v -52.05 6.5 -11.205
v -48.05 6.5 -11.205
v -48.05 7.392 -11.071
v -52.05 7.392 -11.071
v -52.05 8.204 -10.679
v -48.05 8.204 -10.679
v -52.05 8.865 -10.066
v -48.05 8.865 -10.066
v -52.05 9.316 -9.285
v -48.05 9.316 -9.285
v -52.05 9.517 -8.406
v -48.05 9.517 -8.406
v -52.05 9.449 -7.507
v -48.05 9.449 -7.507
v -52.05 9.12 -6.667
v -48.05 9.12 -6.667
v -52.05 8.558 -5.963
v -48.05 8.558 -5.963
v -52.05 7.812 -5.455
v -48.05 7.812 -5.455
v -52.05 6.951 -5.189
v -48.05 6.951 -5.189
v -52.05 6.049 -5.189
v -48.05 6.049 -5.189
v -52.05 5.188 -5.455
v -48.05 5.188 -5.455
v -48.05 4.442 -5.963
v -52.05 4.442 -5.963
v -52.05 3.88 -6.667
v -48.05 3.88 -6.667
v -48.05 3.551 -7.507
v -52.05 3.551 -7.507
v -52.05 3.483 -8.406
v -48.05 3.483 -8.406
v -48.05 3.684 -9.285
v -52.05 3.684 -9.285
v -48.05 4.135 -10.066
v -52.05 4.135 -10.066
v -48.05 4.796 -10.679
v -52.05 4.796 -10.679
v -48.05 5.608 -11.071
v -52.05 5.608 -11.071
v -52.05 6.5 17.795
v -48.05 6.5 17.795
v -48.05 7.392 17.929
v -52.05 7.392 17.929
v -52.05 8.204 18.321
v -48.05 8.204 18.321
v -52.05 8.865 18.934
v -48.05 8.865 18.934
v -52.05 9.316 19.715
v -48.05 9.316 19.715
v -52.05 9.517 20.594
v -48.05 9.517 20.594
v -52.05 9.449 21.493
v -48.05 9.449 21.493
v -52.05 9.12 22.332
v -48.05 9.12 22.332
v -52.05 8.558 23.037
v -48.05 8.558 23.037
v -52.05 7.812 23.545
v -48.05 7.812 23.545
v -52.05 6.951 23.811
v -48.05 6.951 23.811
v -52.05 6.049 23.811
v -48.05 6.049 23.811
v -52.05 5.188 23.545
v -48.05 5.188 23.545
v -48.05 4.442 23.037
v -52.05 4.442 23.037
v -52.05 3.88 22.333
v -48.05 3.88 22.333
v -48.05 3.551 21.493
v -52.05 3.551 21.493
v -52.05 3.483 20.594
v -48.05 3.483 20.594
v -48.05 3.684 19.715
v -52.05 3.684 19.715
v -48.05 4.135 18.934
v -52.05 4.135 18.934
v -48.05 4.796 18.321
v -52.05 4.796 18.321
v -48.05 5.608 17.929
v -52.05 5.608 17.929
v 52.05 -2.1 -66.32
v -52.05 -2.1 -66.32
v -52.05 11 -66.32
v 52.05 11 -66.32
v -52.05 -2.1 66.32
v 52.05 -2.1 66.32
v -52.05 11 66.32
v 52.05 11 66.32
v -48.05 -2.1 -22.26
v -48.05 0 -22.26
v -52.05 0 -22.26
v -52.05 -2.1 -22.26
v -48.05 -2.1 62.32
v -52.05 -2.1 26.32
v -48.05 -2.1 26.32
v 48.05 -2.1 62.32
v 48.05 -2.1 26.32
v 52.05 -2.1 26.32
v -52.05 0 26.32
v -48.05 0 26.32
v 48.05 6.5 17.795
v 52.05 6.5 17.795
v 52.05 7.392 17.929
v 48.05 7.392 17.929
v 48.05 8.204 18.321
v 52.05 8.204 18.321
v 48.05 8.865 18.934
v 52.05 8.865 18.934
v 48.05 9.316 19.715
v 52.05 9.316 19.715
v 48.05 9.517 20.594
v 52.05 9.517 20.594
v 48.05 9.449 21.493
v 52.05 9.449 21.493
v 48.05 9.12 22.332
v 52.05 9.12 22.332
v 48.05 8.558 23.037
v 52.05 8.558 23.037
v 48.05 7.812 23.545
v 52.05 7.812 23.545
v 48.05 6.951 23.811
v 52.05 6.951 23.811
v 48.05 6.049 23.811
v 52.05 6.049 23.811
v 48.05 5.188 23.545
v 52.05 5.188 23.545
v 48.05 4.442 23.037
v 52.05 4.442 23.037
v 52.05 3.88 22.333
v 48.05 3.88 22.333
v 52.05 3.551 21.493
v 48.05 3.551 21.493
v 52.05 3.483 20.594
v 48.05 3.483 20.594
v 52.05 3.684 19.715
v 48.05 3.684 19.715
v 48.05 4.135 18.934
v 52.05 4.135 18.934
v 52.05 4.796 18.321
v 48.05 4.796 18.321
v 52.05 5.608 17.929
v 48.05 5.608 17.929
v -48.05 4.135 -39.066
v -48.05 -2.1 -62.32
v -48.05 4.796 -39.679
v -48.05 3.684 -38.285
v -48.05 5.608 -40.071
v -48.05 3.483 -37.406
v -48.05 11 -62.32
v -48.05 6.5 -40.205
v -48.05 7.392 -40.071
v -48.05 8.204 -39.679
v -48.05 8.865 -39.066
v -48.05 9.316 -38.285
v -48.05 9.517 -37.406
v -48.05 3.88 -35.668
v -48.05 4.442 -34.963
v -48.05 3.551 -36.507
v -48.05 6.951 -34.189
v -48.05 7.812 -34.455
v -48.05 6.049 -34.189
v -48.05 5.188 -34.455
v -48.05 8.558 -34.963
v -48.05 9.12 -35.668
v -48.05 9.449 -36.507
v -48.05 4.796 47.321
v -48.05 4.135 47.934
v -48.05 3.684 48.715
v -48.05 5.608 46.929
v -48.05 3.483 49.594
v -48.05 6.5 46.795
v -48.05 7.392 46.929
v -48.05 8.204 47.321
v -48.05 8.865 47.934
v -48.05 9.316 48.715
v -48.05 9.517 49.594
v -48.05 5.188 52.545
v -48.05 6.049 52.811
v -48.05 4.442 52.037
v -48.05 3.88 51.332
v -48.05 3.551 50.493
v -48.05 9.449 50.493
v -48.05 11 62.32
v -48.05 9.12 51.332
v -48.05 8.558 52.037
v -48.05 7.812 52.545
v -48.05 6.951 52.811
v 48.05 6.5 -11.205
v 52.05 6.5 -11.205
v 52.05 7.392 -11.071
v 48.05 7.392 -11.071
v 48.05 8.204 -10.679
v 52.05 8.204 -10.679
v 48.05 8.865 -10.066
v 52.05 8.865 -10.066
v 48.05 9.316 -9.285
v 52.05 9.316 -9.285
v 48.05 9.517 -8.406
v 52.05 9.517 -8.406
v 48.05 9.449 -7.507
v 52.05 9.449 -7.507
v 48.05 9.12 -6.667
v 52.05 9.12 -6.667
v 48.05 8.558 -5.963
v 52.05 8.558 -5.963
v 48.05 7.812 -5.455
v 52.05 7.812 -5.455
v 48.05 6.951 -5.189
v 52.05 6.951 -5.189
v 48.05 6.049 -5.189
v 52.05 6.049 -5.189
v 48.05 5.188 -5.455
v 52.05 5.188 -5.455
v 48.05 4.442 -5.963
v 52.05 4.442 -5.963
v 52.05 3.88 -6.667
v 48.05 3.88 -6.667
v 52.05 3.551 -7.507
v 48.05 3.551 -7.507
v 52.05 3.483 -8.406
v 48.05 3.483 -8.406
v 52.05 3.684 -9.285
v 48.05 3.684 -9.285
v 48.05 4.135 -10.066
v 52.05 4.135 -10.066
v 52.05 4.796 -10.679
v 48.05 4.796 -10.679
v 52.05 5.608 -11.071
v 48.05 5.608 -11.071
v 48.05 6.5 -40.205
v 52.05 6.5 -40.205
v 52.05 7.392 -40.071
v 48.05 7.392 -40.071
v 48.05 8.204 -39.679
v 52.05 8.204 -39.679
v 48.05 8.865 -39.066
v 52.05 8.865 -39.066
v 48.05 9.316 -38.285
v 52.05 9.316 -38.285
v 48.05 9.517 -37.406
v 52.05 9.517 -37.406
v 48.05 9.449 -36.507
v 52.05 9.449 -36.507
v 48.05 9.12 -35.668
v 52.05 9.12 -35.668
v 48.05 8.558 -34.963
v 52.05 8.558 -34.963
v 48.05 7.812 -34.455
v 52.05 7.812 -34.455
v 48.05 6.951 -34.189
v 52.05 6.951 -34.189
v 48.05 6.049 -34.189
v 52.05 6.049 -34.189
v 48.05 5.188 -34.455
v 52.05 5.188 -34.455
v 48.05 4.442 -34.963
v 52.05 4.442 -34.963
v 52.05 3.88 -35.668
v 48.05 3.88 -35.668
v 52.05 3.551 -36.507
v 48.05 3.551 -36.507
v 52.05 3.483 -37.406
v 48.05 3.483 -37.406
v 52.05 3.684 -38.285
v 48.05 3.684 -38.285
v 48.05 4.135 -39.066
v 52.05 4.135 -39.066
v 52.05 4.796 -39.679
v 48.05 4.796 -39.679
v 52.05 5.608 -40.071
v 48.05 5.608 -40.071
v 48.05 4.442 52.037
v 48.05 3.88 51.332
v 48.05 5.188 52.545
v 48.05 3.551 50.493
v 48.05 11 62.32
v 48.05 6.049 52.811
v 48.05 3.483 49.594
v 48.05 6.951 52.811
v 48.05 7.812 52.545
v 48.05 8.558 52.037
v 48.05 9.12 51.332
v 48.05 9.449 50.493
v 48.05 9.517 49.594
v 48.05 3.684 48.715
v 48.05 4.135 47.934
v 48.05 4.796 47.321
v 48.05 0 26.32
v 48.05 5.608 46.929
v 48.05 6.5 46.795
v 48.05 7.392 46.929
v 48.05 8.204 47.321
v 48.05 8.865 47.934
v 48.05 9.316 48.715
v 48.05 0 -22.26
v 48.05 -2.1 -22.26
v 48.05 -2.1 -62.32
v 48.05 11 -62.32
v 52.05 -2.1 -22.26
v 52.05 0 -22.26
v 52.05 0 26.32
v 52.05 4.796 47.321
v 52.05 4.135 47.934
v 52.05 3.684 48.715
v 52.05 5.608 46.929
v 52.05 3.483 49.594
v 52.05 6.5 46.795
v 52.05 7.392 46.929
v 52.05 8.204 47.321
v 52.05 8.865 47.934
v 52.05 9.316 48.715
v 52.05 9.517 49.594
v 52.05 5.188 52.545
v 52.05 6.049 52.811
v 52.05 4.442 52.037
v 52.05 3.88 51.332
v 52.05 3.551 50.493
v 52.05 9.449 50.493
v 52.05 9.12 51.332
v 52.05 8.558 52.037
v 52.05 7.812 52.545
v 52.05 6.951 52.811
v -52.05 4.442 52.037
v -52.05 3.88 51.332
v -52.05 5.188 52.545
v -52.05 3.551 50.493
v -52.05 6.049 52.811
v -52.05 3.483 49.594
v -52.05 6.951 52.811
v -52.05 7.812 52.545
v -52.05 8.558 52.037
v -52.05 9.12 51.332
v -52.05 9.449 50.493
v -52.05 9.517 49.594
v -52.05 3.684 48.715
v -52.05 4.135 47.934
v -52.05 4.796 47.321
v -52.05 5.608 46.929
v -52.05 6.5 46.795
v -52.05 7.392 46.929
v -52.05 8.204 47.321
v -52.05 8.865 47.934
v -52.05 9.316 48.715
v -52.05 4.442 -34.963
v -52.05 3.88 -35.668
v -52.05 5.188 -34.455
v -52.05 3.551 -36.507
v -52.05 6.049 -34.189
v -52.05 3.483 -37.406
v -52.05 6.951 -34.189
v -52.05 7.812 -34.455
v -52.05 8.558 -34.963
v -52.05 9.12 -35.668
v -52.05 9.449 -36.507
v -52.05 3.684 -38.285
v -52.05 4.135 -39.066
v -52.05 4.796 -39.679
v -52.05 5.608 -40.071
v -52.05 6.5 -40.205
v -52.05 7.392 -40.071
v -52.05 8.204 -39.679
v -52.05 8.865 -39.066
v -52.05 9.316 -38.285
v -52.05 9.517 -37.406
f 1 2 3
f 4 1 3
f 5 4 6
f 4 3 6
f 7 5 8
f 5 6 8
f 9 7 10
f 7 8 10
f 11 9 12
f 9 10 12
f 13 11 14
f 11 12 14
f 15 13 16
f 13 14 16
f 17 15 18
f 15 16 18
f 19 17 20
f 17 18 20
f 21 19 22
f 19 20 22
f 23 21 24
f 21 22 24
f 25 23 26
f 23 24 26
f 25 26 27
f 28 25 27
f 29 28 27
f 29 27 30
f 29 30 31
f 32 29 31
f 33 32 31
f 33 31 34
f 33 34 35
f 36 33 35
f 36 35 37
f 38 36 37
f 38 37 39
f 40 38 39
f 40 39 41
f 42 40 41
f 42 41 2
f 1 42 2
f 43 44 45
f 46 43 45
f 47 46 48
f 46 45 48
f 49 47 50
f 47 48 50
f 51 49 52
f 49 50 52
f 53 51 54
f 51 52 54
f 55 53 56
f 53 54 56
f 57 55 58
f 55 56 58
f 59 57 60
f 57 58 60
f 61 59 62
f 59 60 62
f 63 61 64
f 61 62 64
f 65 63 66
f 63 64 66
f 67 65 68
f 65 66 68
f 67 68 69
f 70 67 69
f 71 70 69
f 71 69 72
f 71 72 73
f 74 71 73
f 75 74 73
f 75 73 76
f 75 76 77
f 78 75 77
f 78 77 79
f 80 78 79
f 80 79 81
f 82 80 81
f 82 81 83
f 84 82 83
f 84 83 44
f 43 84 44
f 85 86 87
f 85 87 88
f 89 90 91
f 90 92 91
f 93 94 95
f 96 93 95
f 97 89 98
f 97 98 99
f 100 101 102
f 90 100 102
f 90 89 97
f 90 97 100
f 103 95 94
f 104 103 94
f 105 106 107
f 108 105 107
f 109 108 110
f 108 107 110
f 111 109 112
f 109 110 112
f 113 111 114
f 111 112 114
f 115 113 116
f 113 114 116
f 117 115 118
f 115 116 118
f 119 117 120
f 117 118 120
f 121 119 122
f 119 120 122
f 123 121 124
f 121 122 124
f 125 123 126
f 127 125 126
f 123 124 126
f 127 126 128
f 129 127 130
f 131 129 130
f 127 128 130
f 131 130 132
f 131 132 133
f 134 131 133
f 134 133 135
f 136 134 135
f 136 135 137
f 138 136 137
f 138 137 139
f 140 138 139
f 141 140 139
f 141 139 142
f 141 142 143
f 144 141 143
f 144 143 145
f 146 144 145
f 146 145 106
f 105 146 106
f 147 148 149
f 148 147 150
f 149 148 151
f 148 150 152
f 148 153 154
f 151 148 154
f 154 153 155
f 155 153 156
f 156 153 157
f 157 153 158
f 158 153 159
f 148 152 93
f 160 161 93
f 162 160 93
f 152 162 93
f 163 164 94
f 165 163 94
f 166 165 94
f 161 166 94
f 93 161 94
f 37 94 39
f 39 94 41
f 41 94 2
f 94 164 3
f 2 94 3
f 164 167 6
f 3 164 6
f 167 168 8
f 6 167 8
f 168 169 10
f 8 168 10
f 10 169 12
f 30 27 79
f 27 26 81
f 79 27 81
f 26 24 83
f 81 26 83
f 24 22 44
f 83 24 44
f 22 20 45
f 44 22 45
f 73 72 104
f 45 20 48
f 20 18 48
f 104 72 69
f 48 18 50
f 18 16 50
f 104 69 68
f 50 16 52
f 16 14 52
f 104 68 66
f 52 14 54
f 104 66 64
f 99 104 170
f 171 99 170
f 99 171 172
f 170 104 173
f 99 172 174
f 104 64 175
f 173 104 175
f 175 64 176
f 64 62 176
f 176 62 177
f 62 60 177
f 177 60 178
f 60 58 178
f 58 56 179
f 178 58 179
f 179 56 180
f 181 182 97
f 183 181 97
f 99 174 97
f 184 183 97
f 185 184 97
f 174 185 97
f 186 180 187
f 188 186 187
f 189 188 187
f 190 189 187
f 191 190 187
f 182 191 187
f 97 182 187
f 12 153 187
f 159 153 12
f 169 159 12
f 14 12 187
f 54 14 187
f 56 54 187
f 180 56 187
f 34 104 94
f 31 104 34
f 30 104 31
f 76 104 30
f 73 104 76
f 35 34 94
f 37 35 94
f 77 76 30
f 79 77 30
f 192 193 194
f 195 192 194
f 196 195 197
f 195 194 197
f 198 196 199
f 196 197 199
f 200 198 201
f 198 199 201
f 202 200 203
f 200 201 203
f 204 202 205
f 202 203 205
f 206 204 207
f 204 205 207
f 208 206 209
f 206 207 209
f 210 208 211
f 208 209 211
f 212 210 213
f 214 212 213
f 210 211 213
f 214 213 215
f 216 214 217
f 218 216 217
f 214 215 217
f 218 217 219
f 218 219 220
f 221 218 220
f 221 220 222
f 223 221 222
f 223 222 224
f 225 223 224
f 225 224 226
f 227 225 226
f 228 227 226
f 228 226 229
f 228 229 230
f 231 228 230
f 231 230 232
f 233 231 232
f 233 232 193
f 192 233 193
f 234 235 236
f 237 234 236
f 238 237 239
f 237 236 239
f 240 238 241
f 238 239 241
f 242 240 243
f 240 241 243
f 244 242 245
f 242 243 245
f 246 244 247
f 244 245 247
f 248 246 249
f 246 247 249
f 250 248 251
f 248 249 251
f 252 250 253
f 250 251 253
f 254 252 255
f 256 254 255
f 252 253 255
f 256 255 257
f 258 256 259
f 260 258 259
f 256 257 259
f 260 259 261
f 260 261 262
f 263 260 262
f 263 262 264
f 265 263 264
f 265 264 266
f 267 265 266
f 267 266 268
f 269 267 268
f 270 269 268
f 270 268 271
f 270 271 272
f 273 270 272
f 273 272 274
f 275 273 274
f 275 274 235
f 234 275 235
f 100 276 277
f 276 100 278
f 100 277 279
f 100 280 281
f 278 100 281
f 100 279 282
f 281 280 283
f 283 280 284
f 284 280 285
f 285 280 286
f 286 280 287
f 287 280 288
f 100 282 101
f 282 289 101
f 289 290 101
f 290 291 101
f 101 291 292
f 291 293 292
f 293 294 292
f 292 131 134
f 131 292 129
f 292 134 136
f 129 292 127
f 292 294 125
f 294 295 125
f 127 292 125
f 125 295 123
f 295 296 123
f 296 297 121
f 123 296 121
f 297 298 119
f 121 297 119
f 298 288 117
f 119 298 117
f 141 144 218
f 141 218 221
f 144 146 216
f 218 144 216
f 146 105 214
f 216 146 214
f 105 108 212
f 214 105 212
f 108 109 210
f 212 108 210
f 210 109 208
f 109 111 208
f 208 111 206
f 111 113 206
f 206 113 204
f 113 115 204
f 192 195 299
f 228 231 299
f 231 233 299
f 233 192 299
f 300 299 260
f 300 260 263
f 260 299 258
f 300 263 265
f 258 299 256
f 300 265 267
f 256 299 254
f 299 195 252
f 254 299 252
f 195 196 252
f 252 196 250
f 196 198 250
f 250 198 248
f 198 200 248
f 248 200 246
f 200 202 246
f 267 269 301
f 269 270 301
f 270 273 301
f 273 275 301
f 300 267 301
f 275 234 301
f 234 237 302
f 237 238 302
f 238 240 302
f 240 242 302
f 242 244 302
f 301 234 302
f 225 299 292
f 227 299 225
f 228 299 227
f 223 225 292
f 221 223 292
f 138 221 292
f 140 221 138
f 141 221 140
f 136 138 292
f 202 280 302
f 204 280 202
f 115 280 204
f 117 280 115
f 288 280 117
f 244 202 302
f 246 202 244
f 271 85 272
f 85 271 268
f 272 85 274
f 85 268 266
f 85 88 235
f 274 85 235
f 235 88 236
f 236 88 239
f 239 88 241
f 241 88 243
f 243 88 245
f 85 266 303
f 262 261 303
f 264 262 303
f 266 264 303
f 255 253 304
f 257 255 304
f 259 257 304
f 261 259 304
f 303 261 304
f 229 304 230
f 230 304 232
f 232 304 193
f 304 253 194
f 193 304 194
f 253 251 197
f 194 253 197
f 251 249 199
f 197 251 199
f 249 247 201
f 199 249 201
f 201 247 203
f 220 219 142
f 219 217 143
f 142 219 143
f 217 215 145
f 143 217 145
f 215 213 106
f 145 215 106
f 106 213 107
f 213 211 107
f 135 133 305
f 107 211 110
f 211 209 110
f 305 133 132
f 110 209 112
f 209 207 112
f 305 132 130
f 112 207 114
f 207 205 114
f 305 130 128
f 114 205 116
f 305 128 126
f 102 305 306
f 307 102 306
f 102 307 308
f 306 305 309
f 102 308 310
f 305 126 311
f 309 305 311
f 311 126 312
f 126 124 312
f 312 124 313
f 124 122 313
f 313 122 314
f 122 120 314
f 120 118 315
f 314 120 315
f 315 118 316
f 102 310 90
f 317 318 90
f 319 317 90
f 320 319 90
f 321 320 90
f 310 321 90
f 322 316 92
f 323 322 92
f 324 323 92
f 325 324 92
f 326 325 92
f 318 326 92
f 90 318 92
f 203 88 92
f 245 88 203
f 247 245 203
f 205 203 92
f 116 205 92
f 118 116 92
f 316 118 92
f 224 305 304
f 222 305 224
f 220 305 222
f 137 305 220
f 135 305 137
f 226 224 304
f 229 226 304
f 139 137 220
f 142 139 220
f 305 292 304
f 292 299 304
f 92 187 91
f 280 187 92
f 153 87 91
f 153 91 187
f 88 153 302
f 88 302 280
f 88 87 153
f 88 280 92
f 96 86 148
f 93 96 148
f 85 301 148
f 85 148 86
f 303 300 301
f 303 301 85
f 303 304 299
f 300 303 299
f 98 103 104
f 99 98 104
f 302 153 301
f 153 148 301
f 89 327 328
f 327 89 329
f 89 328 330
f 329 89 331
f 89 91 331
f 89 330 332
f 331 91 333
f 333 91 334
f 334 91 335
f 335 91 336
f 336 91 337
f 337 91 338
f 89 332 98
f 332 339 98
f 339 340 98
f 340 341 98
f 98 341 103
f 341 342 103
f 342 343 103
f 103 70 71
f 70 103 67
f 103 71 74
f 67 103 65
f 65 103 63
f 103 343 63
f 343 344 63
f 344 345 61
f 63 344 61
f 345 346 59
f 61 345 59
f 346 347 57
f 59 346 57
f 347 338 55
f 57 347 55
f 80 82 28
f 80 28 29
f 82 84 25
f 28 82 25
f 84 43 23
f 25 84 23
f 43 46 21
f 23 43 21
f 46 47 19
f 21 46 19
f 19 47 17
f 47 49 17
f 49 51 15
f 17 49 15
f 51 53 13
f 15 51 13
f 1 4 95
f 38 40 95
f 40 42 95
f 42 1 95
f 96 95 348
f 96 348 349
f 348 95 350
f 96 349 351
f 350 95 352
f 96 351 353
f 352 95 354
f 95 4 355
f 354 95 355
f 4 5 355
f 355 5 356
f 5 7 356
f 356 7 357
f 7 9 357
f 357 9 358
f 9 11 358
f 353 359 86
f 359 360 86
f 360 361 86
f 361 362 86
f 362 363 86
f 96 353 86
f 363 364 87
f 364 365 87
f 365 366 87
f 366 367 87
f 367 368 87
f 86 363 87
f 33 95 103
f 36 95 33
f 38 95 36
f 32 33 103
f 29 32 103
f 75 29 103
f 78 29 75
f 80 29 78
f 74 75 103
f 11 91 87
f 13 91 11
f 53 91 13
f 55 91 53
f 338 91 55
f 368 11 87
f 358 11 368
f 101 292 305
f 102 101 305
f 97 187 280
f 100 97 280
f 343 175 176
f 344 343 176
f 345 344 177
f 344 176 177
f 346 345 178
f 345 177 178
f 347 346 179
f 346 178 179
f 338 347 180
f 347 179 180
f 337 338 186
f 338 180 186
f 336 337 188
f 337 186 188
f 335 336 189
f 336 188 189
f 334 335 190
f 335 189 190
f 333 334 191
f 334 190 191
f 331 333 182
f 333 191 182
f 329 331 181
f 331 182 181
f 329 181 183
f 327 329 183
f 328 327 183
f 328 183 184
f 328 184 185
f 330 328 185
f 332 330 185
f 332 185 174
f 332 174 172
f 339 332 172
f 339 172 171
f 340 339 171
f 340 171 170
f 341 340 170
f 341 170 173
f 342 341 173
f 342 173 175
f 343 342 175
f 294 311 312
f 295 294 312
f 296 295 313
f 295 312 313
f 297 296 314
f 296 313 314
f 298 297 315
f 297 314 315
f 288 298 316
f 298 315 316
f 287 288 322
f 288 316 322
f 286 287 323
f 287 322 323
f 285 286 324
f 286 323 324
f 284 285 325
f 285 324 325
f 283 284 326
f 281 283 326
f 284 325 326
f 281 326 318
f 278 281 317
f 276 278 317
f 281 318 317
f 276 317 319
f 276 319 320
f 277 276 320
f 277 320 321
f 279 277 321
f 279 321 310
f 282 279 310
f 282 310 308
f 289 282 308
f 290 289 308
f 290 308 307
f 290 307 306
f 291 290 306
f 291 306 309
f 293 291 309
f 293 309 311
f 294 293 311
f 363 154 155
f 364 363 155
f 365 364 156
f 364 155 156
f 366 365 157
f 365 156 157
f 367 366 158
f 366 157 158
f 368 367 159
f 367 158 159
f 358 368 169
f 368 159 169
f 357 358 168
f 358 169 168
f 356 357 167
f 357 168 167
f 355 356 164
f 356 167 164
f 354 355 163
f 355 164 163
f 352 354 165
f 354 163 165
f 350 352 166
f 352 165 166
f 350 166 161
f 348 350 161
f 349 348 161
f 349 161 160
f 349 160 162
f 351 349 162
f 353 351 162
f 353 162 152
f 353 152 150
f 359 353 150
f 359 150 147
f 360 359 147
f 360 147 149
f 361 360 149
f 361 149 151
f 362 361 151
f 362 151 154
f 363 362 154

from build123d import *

# Parameters (mm, degrees)
SKETCH1_W           = 104.1
SKETCH1_H           = 132.64
SKETCH1_W_2         = 96.1
SKETCH1_H_2         = 124.64
BOSS_EXTRUDE1_DEPTH = 11
SKETCH3_R           = 3.025
CUT_EXTRUDE1_DEPTH  = 124.919943512
LPATTERN1_COUNT     = 4
LPATTERN1_PITCH     = 29
BOSS_EXTRUDE2_DEPTH = 2.1


with BuildPart() as part:
    # Sketch1 → Boss-Extrude1 (new body)
    with BuildSketch(Plane(origin=(0, 0, 0), x_dir=(1, 0, 0), z_dir=(0, 1, 0))):
        Rectangle(SKETCH1_W, SKETCH1_H)
        Rectangle(SKETCH1_W_2, SKETCH1_H_2, mode=Mode.SUBTRACT)
    extrude(amount=BOSS_EXTRUDE1_DEPTH)

    # Sketch3 → Cut-Extrude1 (cut, through all)
    with BuildSketch(Plane(origin=(52.05, 0, 0), x_dir=(0, 0, -1), z_dir=(1, 0, 0))):
        with Locations((-49.82, 6.5)):
            Circle(SKETCH3_R)
    cut_extrude1 = extrude(amount=-CUT_EXTRUDE1_DEPTH, mode=Mode.SUBTRACT)

    # LPattern1: Cut-Extrude1 ×4
    with Locations(*[(0, 0, -i * LPATTERN1_PITCH) for i in range(1, LPATTERN1_COUNT)]):
        add(cut_extrude1, mode=Mode.SUBTRACT)

    # Sketch5 → Boss-Extrude2 (add)
    with BuildSketch(Plane.XZ):
        Polygon((48.05, 62.32), (48.05, 26.32), (52.05, 26.32), (52.05, 66.32), (-52.05, 66.32), (-52.05, 26.32), (-48.05, 26.32), (-48.05, 62.32), align=None)
        Polygon((-48.05, -22.26), (-52.05, -22.26), (-52.05, -66.32), (52.05, -66.32), (52.05, -22.26), (48.05, -22.26), (48.05, -62.32), (-48.05, -62.32), align=None)
    extrude(amount=BOSS_EXTRUDE2_DEPTH)


solid = part.part
